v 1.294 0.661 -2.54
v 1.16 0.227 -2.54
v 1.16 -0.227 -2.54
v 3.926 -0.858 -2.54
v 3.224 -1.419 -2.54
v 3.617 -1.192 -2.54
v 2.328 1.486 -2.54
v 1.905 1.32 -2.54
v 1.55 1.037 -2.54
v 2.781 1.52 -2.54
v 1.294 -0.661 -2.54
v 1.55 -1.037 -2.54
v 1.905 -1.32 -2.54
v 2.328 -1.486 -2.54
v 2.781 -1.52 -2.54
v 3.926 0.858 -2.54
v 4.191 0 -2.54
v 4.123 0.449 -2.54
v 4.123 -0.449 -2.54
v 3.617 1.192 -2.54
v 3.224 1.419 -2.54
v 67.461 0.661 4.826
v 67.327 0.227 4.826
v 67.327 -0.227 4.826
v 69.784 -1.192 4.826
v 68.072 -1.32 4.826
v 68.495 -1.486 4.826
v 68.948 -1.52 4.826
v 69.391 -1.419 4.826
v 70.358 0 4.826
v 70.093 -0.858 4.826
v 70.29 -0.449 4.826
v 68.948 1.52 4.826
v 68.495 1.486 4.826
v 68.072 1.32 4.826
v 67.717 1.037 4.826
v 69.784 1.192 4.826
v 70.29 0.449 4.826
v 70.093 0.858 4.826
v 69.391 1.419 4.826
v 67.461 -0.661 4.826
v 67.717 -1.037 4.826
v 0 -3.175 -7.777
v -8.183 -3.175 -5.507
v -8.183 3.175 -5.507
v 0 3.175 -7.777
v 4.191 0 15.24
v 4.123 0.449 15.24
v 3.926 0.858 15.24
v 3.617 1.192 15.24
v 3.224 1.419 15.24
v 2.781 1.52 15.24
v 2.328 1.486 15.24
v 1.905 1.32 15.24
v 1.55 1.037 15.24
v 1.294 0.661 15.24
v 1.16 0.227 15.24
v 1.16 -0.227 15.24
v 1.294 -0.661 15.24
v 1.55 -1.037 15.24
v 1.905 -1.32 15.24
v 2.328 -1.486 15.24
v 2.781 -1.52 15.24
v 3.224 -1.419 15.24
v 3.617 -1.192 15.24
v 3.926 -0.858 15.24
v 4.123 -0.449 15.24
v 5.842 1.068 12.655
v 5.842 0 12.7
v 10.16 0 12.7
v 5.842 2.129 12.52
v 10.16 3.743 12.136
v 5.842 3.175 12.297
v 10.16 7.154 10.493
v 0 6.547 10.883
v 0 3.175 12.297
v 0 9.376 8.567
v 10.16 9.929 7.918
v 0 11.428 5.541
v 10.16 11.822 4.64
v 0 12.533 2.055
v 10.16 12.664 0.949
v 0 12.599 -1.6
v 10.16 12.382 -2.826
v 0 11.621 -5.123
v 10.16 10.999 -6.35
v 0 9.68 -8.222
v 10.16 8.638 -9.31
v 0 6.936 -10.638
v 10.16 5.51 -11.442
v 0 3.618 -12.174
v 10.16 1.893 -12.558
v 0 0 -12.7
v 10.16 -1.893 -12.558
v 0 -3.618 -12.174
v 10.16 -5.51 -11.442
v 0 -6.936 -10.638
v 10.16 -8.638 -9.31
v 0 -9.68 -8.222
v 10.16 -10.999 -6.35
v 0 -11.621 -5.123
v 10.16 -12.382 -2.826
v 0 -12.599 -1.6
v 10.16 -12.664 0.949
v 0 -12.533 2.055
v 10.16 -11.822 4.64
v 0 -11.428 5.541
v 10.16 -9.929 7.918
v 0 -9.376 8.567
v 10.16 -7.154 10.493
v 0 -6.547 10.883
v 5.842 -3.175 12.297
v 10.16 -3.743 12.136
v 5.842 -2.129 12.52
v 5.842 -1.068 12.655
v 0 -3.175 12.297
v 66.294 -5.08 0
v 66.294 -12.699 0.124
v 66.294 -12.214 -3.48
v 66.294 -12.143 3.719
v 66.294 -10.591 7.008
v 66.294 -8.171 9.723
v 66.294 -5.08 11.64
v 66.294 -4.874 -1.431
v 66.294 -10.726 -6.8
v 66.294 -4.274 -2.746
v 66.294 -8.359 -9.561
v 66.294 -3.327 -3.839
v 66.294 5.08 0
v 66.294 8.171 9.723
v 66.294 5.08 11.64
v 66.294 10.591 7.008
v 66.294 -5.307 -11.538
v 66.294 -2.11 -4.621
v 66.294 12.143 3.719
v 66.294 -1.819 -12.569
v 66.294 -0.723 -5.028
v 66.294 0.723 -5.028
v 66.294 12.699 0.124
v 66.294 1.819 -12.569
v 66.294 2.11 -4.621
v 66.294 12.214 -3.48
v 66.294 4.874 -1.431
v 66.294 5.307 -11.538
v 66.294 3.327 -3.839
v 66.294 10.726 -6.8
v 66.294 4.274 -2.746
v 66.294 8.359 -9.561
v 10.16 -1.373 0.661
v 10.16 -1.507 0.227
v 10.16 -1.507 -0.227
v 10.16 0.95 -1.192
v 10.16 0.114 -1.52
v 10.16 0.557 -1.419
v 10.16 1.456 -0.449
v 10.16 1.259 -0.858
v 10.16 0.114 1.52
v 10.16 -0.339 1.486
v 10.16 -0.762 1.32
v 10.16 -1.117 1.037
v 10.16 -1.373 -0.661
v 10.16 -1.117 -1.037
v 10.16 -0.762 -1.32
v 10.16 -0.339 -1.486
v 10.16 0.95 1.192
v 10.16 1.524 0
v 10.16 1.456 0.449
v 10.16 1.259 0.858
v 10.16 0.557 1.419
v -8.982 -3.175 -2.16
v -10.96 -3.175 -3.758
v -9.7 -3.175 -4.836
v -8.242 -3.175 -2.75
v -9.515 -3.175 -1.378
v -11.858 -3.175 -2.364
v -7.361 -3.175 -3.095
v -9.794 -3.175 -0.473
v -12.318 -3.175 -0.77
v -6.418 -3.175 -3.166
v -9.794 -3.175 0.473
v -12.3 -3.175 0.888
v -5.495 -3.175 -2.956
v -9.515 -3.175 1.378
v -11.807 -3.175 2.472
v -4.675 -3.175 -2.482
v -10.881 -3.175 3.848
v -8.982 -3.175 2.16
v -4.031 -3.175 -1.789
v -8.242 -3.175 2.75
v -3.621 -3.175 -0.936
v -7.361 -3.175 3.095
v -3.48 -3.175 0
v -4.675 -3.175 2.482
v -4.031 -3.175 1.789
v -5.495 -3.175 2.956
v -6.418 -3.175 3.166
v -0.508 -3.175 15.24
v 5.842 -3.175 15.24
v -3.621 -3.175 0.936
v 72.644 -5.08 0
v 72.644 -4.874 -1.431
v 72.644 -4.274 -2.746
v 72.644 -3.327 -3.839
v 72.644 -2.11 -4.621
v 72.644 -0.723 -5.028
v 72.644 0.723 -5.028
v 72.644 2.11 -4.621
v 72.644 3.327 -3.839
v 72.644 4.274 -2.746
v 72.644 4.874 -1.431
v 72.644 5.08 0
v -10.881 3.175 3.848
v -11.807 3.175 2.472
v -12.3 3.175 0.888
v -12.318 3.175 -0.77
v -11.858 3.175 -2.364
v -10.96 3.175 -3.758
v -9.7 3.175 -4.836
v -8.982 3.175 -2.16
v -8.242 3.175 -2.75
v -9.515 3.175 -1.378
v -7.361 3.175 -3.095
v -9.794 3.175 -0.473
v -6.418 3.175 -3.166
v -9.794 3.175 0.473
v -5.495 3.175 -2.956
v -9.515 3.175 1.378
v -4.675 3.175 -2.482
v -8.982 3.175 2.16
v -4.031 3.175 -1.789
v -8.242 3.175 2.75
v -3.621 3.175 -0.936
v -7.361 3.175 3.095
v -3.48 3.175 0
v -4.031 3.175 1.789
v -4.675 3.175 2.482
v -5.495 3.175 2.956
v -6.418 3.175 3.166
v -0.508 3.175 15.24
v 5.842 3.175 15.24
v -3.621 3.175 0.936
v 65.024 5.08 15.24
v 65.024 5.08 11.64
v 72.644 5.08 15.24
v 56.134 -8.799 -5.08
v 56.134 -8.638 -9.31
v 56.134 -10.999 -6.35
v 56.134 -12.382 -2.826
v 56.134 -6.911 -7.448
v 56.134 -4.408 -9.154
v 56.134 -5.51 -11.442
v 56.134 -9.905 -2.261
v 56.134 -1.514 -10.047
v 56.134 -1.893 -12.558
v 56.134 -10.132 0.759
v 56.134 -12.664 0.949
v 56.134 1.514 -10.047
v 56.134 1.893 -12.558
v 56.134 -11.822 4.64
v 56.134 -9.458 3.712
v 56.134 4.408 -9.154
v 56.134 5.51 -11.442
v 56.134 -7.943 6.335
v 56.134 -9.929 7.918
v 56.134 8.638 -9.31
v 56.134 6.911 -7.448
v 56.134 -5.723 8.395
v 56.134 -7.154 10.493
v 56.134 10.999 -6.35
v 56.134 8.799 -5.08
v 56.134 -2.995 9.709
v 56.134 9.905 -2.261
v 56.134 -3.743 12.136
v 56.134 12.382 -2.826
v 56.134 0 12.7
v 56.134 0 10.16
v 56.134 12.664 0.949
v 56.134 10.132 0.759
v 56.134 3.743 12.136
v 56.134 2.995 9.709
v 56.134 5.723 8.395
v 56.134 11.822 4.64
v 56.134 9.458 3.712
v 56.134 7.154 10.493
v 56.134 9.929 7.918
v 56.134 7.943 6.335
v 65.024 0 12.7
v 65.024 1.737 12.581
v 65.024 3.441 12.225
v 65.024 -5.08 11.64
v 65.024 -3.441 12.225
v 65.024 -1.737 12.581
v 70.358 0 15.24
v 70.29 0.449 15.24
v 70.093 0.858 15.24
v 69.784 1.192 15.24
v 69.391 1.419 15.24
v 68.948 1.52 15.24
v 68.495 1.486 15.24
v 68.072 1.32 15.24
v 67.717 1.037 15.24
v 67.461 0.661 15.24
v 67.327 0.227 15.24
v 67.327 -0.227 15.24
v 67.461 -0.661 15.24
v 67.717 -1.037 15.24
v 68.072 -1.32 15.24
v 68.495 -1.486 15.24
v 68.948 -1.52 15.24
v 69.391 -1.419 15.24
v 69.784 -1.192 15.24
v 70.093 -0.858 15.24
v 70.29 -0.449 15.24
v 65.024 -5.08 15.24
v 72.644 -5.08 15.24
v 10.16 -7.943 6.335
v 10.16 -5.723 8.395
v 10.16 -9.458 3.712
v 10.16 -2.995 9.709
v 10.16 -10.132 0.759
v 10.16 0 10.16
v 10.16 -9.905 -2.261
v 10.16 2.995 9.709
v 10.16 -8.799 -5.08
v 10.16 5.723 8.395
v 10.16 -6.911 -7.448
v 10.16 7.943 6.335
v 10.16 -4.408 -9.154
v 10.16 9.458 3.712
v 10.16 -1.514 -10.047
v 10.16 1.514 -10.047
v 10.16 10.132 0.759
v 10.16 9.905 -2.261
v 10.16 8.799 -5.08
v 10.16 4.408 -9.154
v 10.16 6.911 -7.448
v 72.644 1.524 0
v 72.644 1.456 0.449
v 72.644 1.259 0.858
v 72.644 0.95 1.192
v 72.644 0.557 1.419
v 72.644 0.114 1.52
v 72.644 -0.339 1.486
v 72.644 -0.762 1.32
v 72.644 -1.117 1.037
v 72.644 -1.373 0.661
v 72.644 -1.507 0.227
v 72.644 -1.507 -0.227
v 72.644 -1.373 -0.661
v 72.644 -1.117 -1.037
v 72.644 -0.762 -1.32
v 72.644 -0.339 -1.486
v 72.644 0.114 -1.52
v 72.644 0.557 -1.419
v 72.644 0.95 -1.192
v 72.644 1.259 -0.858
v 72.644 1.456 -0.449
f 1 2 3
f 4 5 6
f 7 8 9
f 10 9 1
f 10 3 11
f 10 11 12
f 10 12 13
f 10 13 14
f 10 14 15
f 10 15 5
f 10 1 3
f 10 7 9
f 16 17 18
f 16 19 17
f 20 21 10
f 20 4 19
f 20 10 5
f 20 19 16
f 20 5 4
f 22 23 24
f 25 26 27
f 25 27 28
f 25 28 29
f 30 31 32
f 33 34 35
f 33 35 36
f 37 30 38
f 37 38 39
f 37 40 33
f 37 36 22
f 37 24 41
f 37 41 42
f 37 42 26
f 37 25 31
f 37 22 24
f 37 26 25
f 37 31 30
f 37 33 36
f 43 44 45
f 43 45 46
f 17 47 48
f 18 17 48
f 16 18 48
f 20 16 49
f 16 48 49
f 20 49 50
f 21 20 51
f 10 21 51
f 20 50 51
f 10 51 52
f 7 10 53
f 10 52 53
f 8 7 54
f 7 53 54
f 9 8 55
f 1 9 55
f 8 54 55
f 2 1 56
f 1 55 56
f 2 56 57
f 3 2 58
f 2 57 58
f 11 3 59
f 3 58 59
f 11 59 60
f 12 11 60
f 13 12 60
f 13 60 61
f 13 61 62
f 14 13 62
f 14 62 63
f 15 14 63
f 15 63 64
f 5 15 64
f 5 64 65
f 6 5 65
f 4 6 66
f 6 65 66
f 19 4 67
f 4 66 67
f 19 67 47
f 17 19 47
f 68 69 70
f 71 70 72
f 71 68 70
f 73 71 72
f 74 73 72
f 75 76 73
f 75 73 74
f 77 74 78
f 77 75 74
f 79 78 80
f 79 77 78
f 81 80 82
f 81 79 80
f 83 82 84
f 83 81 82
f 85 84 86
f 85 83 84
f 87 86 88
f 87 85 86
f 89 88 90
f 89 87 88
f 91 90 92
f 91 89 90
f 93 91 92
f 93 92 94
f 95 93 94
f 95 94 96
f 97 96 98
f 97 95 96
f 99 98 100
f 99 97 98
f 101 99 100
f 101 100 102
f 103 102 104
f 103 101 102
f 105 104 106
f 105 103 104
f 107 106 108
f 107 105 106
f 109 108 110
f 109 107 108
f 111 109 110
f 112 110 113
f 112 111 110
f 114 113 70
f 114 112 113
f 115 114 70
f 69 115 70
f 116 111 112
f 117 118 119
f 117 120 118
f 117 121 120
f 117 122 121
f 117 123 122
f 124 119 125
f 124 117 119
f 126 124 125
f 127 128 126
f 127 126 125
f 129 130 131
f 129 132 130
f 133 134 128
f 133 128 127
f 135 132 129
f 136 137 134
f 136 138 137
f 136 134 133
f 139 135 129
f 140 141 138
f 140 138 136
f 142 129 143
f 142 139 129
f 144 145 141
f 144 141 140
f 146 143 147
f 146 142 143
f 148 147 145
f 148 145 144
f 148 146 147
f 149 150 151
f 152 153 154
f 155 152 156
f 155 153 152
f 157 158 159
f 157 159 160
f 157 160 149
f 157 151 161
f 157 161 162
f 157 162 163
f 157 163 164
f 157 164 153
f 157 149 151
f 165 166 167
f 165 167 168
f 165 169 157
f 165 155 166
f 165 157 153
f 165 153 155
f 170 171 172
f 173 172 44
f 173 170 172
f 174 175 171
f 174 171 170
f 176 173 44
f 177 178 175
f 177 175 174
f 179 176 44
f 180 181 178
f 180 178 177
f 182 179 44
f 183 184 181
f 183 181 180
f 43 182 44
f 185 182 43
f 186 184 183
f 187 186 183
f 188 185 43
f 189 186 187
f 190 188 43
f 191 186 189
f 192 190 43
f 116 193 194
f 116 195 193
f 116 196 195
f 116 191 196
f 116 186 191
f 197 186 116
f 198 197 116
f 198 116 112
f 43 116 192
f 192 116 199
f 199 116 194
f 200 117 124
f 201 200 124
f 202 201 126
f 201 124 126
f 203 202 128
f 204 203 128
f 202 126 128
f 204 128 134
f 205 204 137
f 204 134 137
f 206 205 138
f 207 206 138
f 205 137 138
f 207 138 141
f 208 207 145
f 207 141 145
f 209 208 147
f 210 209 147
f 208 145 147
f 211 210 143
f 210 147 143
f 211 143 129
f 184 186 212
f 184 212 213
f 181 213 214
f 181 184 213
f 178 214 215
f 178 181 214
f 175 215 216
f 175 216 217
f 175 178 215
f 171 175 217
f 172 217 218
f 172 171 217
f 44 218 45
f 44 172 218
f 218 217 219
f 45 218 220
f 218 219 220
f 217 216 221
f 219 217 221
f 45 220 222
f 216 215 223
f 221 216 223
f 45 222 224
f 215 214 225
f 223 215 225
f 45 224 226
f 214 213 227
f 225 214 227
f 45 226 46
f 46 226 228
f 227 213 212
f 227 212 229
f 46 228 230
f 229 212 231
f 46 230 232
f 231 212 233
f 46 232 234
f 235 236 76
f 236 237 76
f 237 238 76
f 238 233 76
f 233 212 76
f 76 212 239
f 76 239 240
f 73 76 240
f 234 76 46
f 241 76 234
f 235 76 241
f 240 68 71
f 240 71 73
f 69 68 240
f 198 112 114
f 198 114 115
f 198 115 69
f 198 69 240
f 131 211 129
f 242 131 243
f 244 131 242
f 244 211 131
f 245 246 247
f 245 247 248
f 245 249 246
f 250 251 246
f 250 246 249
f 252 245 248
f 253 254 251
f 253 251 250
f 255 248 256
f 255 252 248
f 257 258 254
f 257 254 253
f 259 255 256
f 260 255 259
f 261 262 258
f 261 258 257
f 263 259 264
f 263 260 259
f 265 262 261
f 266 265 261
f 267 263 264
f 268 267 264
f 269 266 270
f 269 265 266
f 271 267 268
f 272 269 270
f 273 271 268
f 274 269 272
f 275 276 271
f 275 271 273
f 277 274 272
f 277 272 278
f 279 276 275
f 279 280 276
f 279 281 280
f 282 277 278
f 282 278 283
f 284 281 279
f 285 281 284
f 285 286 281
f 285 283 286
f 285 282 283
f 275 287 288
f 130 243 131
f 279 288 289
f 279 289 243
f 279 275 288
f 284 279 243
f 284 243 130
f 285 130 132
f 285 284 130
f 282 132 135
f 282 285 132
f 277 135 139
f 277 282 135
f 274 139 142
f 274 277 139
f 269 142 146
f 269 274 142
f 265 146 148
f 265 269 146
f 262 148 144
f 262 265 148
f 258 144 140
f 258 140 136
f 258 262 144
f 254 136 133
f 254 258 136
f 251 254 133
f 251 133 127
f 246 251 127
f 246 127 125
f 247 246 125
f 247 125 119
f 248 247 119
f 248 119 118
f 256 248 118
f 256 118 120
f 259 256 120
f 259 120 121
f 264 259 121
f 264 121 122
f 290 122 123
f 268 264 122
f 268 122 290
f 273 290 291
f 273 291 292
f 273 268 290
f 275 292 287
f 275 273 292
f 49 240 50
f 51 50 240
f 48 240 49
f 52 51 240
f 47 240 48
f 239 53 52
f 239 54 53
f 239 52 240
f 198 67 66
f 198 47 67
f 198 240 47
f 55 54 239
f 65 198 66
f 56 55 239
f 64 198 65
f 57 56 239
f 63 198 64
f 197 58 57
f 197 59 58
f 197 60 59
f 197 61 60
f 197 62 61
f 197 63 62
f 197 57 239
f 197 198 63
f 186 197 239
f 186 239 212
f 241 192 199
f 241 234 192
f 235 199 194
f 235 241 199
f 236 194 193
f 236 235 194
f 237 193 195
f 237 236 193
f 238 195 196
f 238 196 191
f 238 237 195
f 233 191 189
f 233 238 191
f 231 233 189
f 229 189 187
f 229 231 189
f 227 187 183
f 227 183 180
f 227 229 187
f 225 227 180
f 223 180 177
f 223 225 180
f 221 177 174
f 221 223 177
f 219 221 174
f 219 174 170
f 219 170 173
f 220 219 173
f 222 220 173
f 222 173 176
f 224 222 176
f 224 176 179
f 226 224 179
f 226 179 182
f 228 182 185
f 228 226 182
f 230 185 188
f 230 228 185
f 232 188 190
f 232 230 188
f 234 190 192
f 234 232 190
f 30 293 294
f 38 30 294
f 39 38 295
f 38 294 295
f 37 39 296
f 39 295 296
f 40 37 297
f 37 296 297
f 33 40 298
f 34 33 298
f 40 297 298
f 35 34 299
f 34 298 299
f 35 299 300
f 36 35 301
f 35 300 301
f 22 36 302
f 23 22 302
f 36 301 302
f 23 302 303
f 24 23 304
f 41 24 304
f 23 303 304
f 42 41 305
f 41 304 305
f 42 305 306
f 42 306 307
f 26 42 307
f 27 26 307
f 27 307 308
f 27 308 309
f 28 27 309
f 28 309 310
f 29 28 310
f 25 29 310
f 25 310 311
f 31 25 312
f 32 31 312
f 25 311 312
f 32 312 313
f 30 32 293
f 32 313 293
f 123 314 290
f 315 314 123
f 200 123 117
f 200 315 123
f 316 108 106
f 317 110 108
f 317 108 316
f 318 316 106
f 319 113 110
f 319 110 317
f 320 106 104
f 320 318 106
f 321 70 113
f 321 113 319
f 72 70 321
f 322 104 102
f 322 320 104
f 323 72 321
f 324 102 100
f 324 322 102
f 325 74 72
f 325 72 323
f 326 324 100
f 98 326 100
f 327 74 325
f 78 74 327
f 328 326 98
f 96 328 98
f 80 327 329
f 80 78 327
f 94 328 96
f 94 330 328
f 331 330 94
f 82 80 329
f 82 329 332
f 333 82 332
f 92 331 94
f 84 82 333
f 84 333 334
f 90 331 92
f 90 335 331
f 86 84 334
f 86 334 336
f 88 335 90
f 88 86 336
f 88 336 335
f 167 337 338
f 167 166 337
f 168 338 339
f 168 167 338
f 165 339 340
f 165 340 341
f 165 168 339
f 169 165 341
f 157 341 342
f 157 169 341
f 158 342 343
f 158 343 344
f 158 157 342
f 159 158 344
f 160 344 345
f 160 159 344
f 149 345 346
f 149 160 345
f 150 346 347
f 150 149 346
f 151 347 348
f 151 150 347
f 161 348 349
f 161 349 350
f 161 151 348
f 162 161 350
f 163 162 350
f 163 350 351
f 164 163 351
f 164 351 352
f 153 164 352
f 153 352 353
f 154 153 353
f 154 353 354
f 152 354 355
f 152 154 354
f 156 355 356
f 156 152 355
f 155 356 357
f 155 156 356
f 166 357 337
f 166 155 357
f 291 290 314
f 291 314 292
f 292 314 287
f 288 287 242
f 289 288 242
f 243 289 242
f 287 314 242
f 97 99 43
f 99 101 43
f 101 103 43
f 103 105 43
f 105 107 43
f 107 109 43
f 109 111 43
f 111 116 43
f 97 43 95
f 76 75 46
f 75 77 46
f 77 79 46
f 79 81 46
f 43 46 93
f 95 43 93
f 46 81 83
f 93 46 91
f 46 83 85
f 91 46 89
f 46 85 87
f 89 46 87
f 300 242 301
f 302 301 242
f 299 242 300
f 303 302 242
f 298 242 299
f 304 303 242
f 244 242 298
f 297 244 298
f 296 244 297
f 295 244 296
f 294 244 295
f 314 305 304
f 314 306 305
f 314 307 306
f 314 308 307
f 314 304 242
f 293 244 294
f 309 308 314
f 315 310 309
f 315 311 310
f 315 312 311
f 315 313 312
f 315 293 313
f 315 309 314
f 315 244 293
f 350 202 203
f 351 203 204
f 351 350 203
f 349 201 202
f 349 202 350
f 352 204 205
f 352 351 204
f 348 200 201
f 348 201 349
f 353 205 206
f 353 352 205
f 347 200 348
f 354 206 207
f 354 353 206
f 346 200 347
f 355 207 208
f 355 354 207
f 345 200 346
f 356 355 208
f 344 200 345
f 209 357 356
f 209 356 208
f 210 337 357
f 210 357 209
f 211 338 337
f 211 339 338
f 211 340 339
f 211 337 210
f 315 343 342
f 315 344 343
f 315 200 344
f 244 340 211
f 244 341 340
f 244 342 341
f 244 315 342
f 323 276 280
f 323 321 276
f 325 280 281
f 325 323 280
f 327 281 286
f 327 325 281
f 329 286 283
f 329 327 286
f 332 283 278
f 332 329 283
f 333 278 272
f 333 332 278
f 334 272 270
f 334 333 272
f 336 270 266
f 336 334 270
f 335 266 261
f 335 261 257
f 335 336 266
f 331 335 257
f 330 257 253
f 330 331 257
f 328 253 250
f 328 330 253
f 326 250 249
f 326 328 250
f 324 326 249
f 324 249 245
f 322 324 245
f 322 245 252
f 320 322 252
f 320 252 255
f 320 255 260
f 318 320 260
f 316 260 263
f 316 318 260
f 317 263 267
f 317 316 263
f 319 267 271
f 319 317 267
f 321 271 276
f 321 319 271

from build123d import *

# Parameters (mm, degrees)
F0_W      = 5.842
F0_H      = 12.7
F0_R      = 3.175
F2_DEPTH  = 3.175
F3_R      = 1.524
F4_DEPTH  = 6.35
F5_DEPTH  = 1.27
F6_DEPTH  = 6.35
F7_DEPTH  = 56.134
F8_R      = 1.524
F9_DEPTH  = 10.414
F10_R     = 1.524
F11_DEPTH = 17.78


with BuildPart() as f1:
    # F0 (on Front) → F1 (revolve)
    with BuildSketch(Plane.XZ):
        Polygon((5.842, 12.7), (5.842, 0), (66.294, 0), (66.294, 12.7), (56.134, 12.7), (56.134, 10.16), (10.16, 10.16), (10.16, 12.7), align=None)
        with Locations((2.921, 6.35)):
            Rectangle(F0_W, F0_H)
    revolve(axis=Axis((33.147, 0, 0), (-1, 0, 0)))

    # F0 (on Front) → F2 (join, symmetric)
    with BuildSketch(Plane.XZ):
        with Locations((2.921, 6.35)):
            Rectangle(F0_W, F0_H)
        with BuildLine():
            Line((-0.9398, 0), (0, 0))
            Line((0, 0), (0, 12.7))
            Line((0, 12.7), (5.842, 12.7))
            Line((5.842, 12.7), (5.842, 15.24))
            Line((5.842, 15.24), (-0.508, 15.24))
            Line((-0.508, 15.24), (-10.8806298187, 3.8475430269))
            ThreePointArc((-10.8806298187, 3.8475430269), (-4.5919612295, 5.3297205562), (-0.9398, 0))
        make_face()
        with BuildLine():
            Line((5.842, 0), (0, 0))
            Line((0, 0), (-0.9398, 0))
            ThreePointArc((-0.9398, 0), (-3.1957909266, -4.5493385486), (-8.1826630726, -5.5069827884))
            Line((-8.1826630726, -5.5069827884), (5.842, -9.398))
            Line((5.842, -9.398), (5.842, 0))
        make_face()
        with BuildLine():
            ThreePointArc((-8.1826630726, -5.5069827884), (-3.1957909266, -4.5493385486), (-0.9398, 0))
            ThreePointArc((-0.9398, 0), (-4.5919612295, 5.3297205562), (-10.8806298187, 3.8475430269))
            ThreePointArc((-10.8806298187, 3.8475430269), (-12.1459778134, -1.5837270034), (-8.1826630726, -5.5069827884))
        make_face()
        with Locations((-6.6548, 0)):
            Circle(F0_R, mode=Mode.SUBTRACT)
    extrude(amount=F2_DEPTH, both=True)

    # F3 (on face) → F4 (join)
    with BuildSketch(Plane.YZ.offset(66.294)):
        with BuildLine():
            ThreePointArc((-5.08, 0), (0, 5.08), (5.08, 0))
            Line((5.08, 0), (5.08, 11.6397422652))
            ThreePointArc((5.08, 11.6397422652), (0, 12.7), (-5.08, 11.6397422652))
            Line((-5.08, 11.6397422652), (-5.08, 0))
        make_face()
        with BuildLine():
            ThreePointArc((-5.08, 0), (0, -5.08), (5.08, 0))
            ThreePointArc((5.08, 0), (0, 5.08), (-5.08, 0))
        make_face()
        Circle(F3_R, mode=Mode.SUBTRACT)
        with BuildLine():
            ThreePointArc((-5.08, 11.6397422652), (0, 12.7), (5.08, 11.6397422652))
            Line((5.08, 11.6397422652), (5.08, 15.24))
            Line((5.08, 15.24), (3.175, 15.24))
            Line((3.175, 15.24), (-3.175, 15.24))
            Line((-3.175, 15.24), (-5.08, 15.24))
            Line((-5.08, 15.24), (-5.08, 11.6397422652))
        make_face()
        Circle(F3_R)
    extrude(amount=F4_DEPTH)

    # F3 (on face) → F5 (join)
    with BuildSketch(Plane.YZ.offset(66.294)):
        with BuildLine():
            ThreePointArc((-5.08, 0), (0, -5.08), (5.08, 0))
            ThreePointArc((5.08, 0), (0, 5.08), (-5.08, 0))
        make_face()
        Circle(F3_R, mode=Mode.SUBTRACT)
        with BuildLine():
            ThreePointArc((-5.08, 0), (0, 5.08), (5.08, 0))
            Line((5.08, 0), (5.08, 15.24))
            Line((5.08, 15.24), (3.175, 15.24))
            Line((3.175, 15.24), (-3.175, 15.24))
            Line((-3.175, 15.24), (-5.08, 15.24))
            Line((-5.08, 15.24), (-5.08, 0))
        make_face()
    extrude(amount=-F5_DEPTH)

    # F3 (on face) → F6 (cut)
    with BuildSketch(Plane.YZ.offset(66.294)):
        Circle(F3_R)
    extrude(amount=F6_DEPTH, mode=Mode.SUBTRACT)

    # F3 (on face) → F7 (cut, through all)
    with BuildSketch(Plane.YZ.offset(66.294)):
        Circle(F3_R)
    extrude(amount=-F7_DEPTH, mode=Mode.SUBTRACT)

    # F8 (on face) → F9 (cut)
    with BuildSketch(Plane.XY.offset(15.24)):
        with Locations((68.834, 0)):
            Circle(F8_R)
    extrude(amount=-F9_DEPTH, mode=Mode.SUBTRACT)

    # F10 (on face) → F11 (cut)
    with BuildSketch(Plane.XY.offset(15.24)):
        with Locations((2.667, 0)):
            Circle(F10_R)
    extrude(amount=-F11_DEPTH, mode=Mode.SUBTRACT)


solid = f1.part
